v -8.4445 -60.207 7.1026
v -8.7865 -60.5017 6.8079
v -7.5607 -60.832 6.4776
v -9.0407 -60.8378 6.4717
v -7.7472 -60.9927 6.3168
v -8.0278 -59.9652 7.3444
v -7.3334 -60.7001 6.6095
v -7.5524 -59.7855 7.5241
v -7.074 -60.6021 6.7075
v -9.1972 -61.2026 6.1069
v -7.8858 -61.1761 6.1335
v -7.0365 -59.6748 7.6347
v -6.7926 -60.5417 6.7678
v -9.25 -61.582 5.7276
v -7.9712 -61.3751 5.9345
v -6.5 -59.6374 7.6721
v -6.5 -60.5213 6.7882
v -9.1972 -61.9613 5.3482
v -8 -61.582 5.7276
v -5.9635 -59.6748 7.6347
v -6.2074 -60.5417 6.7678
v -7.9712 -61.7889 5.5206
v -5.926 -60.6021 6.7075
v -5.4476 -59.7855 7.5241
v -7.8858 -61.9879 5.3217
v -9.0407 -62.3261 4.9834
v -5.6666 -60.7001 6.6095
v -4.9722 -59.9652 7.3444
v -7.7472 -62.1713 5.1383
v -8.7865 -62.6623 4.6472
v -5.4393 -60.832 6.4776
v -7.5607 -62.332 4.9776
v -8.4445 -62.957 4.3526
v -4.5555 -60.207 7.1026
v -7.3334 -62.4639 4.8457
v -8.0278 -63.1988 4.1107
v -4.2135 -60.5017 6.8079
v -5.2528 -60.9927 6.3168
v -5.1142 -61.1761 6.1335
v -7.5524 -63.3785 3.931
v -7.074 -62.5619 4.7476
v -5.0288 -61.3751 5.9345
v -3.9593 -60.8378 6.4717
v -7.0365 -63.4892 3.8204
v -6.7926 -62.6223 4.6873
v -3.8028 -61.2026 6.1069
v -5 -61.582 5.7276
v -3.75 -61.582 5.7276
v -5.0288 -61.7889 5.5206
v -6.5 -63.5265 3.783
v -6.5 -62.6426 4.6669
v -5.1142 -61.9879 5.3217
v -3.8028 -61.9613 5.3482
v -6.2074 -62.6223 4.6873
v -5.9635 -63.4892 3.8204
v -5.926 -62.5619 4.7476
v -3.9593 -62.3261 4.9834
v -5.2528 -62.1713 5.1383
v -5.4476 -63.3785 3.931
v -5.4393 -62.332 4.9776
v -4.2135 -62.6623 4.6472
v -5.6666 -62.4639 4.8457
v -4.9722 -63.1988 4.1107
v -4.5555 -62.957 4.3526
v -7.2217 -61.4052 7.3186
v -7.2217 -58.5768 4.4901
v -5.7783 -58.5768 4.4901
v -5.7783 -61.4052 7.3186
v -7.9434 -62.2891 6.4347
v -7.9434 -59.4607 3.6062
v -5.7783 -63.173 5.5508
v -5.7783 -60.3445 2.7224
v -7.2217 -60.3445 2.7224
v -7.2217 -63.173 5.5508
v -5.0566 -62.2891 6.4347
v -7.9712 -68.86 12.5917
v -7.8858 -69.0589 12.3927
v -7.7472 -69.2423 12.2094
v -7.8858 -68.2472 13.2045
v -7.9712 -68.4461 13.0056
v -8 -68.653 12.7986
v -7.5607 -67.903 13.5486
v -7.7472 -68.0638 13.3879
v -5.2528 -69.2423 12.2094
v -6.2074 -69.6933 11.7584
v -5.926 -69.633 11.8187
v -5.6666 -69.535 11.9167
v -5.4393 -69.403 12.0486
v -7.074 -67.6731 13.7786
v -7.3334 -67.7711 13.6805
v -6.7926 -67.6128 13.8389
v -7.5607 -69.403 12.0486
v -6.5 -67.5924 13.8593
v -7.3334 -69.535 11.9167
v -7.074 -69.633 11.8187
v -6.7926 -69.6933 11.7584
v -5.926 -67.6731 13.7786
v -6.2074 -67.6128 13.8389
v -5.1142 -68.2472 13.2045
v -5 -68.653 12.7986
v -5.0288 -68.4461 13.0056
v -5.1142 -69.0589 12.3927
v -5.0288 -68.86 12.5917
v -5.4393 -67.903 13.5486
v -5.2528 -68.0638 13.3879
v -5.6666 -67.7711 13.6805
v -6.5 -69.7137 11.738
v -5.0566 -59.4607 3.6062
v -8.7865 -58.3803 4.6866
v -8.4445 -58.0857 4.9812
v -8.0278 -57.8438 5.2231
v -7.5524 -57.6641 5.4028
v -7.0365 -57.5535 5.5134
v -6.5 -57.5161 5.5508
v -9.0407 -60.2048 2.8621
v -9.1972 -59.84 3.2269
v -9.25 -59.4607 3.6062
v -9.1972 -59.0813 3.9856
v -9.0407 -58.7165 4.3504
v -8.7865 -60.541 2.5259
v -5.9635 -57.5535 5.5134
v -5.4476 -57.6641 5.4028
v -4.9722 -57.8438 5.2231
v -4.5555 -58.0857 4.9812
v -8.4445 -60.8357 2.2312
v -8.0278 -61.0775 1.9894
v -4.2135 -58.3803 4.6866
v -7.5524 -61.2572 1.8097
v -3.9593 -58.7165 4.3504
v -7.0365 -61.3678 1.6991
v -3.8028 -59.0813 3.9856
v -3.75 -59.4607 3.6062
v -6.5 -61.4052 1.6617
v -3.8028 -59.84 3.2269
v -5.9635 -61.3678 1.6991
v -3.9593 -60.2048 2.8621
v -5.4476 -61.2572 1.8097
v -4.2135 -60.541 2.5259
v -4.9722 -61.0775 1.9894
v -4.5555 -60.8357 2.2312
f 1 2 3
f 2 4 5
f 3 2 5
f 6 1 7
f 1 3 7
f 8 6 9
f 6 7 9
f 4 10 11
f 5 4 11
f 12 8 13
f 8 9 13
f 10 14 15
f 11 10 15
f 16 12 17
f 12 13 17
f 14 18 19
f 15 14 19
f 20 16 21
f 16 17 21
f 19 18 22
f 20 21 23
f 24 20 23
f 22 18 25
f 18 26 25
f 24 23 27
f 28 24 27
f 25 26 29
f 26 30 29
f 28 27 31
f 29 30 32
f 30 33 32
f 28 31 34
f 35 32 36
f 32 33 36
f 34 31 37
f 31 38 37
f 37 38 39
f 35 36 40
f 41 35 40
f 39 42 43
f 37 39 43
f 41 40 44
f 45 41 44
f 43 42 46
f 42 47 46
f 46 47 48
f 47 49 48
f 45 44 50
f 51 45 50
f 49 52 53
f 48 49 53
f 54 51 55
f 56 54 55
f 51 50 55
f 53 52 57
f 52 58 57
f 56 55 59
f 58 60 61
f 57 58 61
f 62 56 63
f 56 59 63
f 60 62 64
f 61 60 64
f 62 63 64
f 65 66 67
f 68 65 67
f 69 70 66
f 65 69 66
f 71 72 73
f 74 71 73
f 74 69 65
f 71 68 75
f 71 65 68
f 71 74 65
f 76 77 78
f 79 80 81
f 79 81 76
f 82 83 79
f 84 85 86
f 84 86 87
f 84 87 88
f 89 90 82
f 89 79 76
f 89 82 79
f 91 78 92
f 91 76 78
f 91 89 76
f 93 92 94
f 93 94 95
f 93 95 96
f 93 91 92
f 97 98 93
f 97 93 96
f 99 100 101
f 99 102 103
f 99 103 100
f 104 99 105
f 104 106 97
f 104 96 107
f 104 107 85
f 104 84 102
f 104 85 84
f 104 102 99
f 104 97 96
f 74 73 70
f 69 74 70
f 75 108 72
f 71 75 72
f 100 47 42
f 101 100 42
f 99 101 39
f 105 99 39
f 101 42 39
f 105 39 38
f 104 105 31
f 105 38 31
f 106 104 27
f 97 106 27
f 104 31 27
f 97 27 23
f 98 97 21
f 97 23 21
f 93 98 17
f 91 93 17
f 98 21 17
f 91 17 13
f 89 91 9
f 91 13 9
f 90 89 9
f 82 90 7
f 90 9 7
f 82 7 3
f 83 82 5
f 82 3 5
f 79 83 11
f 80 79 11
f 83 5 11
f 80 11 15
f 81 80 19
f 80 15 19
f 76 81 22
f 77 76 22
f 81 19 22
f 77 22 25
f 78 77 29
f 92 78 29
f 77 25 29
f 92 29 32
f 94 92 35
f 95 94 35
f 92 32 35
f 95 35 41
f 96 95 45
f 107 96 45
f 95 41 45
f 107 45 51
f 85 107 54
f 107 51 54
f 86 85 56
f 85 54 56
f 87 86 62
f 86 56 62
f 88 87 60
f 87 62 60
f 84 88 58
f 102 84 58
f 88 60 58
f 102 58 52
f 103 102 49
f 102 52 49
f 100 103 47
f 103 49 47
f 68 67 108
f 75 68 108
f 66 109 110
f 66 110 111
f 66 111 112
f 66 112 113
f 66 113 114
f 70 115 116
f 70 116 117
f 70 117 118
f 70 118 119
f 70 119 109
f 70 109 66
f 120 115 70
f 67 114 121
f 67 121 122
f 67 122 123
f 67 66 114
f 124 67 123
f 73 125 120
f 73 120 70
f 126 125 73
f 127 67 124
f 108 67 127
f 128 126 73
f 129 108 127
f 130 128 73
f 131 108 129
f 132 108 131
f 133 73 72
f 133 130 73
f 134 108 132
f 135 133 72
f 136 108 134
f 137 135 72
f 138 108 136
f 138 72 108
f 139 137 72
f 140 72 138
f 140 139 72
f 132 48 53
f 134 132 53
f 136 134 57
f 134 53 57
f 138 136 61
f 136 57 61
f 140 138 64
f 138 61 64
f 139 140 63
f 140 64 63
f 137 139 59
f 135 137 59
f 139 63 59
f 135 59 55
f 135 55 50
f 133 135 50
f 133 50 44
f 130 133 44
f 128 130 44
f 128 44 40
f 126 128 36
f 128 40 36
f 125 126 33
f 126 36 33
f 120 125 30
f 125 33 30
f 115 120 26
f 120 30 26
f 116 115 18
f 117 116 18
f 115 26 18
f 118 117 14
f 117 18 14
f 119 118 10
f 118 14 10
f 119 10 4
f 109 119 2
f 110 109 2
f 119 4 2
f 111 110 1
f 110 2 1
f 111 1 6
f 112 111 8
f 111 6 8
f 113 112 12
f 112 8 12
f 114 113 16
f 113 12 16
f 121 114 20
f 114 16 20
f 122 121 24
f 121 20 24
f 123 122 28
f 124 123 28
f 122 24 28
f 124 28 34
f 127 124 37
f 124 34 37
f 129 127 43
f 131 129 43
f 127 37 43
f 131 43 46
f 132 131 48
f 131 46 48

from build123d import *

# Parameters (mm, degrees)
SKETCH020_R             = 2.75
PAD008_DEPTH            = 3
SKETCH001_R             = 1.5
PAD009_DEPTH            = 10
POCKET011_DEPTH         = 4
BODY003_PLACEMENT_ANGLE = 225


with BuildPart() as part:
    # Sketch020 → Pad008 (new body)
    with BuildSketch(Plane.XY):
        Circle(SKETCH020_R)
    extrude(amount=PAD008_DEPTH)

    # Sketch001 (on Face2 of Pad008) → Pad009 (join)
    with BuildSketch(Plane(origin=(0, 0, 0), x_dir=(1, 0, 0), z_dir=(0, 0, -1))):
        Circle(SKETCH001_R)
    extrude(amount=PAD009_DEPTH)

    # Sketch021 (on DatumPlane) → Pocket011 (cut)
    with BuildSketch(Plane.XY.offset(3)):
        Polygon((0.721688, -1.25), (1.443376, 0), (0.721688, 1.25), (-0.721688, 1.25), (-1.443376, 0), (-0.721688, -1.25), align=None)
    extrude(amount=-POCKET011_DEPTH, mode=Mode.SUBTRACT)


with BuildPart() as part_1:
    # Body003 placement: moved
    add(part.part.moved(Location((-6.5, -61.581981, 5.727565))).rotate(Axis((-6.5, -61.581981, 5.727565), (1, 0, 0)), BODY003_PLACEMENT_ANGLE))


solid = part_1.part
